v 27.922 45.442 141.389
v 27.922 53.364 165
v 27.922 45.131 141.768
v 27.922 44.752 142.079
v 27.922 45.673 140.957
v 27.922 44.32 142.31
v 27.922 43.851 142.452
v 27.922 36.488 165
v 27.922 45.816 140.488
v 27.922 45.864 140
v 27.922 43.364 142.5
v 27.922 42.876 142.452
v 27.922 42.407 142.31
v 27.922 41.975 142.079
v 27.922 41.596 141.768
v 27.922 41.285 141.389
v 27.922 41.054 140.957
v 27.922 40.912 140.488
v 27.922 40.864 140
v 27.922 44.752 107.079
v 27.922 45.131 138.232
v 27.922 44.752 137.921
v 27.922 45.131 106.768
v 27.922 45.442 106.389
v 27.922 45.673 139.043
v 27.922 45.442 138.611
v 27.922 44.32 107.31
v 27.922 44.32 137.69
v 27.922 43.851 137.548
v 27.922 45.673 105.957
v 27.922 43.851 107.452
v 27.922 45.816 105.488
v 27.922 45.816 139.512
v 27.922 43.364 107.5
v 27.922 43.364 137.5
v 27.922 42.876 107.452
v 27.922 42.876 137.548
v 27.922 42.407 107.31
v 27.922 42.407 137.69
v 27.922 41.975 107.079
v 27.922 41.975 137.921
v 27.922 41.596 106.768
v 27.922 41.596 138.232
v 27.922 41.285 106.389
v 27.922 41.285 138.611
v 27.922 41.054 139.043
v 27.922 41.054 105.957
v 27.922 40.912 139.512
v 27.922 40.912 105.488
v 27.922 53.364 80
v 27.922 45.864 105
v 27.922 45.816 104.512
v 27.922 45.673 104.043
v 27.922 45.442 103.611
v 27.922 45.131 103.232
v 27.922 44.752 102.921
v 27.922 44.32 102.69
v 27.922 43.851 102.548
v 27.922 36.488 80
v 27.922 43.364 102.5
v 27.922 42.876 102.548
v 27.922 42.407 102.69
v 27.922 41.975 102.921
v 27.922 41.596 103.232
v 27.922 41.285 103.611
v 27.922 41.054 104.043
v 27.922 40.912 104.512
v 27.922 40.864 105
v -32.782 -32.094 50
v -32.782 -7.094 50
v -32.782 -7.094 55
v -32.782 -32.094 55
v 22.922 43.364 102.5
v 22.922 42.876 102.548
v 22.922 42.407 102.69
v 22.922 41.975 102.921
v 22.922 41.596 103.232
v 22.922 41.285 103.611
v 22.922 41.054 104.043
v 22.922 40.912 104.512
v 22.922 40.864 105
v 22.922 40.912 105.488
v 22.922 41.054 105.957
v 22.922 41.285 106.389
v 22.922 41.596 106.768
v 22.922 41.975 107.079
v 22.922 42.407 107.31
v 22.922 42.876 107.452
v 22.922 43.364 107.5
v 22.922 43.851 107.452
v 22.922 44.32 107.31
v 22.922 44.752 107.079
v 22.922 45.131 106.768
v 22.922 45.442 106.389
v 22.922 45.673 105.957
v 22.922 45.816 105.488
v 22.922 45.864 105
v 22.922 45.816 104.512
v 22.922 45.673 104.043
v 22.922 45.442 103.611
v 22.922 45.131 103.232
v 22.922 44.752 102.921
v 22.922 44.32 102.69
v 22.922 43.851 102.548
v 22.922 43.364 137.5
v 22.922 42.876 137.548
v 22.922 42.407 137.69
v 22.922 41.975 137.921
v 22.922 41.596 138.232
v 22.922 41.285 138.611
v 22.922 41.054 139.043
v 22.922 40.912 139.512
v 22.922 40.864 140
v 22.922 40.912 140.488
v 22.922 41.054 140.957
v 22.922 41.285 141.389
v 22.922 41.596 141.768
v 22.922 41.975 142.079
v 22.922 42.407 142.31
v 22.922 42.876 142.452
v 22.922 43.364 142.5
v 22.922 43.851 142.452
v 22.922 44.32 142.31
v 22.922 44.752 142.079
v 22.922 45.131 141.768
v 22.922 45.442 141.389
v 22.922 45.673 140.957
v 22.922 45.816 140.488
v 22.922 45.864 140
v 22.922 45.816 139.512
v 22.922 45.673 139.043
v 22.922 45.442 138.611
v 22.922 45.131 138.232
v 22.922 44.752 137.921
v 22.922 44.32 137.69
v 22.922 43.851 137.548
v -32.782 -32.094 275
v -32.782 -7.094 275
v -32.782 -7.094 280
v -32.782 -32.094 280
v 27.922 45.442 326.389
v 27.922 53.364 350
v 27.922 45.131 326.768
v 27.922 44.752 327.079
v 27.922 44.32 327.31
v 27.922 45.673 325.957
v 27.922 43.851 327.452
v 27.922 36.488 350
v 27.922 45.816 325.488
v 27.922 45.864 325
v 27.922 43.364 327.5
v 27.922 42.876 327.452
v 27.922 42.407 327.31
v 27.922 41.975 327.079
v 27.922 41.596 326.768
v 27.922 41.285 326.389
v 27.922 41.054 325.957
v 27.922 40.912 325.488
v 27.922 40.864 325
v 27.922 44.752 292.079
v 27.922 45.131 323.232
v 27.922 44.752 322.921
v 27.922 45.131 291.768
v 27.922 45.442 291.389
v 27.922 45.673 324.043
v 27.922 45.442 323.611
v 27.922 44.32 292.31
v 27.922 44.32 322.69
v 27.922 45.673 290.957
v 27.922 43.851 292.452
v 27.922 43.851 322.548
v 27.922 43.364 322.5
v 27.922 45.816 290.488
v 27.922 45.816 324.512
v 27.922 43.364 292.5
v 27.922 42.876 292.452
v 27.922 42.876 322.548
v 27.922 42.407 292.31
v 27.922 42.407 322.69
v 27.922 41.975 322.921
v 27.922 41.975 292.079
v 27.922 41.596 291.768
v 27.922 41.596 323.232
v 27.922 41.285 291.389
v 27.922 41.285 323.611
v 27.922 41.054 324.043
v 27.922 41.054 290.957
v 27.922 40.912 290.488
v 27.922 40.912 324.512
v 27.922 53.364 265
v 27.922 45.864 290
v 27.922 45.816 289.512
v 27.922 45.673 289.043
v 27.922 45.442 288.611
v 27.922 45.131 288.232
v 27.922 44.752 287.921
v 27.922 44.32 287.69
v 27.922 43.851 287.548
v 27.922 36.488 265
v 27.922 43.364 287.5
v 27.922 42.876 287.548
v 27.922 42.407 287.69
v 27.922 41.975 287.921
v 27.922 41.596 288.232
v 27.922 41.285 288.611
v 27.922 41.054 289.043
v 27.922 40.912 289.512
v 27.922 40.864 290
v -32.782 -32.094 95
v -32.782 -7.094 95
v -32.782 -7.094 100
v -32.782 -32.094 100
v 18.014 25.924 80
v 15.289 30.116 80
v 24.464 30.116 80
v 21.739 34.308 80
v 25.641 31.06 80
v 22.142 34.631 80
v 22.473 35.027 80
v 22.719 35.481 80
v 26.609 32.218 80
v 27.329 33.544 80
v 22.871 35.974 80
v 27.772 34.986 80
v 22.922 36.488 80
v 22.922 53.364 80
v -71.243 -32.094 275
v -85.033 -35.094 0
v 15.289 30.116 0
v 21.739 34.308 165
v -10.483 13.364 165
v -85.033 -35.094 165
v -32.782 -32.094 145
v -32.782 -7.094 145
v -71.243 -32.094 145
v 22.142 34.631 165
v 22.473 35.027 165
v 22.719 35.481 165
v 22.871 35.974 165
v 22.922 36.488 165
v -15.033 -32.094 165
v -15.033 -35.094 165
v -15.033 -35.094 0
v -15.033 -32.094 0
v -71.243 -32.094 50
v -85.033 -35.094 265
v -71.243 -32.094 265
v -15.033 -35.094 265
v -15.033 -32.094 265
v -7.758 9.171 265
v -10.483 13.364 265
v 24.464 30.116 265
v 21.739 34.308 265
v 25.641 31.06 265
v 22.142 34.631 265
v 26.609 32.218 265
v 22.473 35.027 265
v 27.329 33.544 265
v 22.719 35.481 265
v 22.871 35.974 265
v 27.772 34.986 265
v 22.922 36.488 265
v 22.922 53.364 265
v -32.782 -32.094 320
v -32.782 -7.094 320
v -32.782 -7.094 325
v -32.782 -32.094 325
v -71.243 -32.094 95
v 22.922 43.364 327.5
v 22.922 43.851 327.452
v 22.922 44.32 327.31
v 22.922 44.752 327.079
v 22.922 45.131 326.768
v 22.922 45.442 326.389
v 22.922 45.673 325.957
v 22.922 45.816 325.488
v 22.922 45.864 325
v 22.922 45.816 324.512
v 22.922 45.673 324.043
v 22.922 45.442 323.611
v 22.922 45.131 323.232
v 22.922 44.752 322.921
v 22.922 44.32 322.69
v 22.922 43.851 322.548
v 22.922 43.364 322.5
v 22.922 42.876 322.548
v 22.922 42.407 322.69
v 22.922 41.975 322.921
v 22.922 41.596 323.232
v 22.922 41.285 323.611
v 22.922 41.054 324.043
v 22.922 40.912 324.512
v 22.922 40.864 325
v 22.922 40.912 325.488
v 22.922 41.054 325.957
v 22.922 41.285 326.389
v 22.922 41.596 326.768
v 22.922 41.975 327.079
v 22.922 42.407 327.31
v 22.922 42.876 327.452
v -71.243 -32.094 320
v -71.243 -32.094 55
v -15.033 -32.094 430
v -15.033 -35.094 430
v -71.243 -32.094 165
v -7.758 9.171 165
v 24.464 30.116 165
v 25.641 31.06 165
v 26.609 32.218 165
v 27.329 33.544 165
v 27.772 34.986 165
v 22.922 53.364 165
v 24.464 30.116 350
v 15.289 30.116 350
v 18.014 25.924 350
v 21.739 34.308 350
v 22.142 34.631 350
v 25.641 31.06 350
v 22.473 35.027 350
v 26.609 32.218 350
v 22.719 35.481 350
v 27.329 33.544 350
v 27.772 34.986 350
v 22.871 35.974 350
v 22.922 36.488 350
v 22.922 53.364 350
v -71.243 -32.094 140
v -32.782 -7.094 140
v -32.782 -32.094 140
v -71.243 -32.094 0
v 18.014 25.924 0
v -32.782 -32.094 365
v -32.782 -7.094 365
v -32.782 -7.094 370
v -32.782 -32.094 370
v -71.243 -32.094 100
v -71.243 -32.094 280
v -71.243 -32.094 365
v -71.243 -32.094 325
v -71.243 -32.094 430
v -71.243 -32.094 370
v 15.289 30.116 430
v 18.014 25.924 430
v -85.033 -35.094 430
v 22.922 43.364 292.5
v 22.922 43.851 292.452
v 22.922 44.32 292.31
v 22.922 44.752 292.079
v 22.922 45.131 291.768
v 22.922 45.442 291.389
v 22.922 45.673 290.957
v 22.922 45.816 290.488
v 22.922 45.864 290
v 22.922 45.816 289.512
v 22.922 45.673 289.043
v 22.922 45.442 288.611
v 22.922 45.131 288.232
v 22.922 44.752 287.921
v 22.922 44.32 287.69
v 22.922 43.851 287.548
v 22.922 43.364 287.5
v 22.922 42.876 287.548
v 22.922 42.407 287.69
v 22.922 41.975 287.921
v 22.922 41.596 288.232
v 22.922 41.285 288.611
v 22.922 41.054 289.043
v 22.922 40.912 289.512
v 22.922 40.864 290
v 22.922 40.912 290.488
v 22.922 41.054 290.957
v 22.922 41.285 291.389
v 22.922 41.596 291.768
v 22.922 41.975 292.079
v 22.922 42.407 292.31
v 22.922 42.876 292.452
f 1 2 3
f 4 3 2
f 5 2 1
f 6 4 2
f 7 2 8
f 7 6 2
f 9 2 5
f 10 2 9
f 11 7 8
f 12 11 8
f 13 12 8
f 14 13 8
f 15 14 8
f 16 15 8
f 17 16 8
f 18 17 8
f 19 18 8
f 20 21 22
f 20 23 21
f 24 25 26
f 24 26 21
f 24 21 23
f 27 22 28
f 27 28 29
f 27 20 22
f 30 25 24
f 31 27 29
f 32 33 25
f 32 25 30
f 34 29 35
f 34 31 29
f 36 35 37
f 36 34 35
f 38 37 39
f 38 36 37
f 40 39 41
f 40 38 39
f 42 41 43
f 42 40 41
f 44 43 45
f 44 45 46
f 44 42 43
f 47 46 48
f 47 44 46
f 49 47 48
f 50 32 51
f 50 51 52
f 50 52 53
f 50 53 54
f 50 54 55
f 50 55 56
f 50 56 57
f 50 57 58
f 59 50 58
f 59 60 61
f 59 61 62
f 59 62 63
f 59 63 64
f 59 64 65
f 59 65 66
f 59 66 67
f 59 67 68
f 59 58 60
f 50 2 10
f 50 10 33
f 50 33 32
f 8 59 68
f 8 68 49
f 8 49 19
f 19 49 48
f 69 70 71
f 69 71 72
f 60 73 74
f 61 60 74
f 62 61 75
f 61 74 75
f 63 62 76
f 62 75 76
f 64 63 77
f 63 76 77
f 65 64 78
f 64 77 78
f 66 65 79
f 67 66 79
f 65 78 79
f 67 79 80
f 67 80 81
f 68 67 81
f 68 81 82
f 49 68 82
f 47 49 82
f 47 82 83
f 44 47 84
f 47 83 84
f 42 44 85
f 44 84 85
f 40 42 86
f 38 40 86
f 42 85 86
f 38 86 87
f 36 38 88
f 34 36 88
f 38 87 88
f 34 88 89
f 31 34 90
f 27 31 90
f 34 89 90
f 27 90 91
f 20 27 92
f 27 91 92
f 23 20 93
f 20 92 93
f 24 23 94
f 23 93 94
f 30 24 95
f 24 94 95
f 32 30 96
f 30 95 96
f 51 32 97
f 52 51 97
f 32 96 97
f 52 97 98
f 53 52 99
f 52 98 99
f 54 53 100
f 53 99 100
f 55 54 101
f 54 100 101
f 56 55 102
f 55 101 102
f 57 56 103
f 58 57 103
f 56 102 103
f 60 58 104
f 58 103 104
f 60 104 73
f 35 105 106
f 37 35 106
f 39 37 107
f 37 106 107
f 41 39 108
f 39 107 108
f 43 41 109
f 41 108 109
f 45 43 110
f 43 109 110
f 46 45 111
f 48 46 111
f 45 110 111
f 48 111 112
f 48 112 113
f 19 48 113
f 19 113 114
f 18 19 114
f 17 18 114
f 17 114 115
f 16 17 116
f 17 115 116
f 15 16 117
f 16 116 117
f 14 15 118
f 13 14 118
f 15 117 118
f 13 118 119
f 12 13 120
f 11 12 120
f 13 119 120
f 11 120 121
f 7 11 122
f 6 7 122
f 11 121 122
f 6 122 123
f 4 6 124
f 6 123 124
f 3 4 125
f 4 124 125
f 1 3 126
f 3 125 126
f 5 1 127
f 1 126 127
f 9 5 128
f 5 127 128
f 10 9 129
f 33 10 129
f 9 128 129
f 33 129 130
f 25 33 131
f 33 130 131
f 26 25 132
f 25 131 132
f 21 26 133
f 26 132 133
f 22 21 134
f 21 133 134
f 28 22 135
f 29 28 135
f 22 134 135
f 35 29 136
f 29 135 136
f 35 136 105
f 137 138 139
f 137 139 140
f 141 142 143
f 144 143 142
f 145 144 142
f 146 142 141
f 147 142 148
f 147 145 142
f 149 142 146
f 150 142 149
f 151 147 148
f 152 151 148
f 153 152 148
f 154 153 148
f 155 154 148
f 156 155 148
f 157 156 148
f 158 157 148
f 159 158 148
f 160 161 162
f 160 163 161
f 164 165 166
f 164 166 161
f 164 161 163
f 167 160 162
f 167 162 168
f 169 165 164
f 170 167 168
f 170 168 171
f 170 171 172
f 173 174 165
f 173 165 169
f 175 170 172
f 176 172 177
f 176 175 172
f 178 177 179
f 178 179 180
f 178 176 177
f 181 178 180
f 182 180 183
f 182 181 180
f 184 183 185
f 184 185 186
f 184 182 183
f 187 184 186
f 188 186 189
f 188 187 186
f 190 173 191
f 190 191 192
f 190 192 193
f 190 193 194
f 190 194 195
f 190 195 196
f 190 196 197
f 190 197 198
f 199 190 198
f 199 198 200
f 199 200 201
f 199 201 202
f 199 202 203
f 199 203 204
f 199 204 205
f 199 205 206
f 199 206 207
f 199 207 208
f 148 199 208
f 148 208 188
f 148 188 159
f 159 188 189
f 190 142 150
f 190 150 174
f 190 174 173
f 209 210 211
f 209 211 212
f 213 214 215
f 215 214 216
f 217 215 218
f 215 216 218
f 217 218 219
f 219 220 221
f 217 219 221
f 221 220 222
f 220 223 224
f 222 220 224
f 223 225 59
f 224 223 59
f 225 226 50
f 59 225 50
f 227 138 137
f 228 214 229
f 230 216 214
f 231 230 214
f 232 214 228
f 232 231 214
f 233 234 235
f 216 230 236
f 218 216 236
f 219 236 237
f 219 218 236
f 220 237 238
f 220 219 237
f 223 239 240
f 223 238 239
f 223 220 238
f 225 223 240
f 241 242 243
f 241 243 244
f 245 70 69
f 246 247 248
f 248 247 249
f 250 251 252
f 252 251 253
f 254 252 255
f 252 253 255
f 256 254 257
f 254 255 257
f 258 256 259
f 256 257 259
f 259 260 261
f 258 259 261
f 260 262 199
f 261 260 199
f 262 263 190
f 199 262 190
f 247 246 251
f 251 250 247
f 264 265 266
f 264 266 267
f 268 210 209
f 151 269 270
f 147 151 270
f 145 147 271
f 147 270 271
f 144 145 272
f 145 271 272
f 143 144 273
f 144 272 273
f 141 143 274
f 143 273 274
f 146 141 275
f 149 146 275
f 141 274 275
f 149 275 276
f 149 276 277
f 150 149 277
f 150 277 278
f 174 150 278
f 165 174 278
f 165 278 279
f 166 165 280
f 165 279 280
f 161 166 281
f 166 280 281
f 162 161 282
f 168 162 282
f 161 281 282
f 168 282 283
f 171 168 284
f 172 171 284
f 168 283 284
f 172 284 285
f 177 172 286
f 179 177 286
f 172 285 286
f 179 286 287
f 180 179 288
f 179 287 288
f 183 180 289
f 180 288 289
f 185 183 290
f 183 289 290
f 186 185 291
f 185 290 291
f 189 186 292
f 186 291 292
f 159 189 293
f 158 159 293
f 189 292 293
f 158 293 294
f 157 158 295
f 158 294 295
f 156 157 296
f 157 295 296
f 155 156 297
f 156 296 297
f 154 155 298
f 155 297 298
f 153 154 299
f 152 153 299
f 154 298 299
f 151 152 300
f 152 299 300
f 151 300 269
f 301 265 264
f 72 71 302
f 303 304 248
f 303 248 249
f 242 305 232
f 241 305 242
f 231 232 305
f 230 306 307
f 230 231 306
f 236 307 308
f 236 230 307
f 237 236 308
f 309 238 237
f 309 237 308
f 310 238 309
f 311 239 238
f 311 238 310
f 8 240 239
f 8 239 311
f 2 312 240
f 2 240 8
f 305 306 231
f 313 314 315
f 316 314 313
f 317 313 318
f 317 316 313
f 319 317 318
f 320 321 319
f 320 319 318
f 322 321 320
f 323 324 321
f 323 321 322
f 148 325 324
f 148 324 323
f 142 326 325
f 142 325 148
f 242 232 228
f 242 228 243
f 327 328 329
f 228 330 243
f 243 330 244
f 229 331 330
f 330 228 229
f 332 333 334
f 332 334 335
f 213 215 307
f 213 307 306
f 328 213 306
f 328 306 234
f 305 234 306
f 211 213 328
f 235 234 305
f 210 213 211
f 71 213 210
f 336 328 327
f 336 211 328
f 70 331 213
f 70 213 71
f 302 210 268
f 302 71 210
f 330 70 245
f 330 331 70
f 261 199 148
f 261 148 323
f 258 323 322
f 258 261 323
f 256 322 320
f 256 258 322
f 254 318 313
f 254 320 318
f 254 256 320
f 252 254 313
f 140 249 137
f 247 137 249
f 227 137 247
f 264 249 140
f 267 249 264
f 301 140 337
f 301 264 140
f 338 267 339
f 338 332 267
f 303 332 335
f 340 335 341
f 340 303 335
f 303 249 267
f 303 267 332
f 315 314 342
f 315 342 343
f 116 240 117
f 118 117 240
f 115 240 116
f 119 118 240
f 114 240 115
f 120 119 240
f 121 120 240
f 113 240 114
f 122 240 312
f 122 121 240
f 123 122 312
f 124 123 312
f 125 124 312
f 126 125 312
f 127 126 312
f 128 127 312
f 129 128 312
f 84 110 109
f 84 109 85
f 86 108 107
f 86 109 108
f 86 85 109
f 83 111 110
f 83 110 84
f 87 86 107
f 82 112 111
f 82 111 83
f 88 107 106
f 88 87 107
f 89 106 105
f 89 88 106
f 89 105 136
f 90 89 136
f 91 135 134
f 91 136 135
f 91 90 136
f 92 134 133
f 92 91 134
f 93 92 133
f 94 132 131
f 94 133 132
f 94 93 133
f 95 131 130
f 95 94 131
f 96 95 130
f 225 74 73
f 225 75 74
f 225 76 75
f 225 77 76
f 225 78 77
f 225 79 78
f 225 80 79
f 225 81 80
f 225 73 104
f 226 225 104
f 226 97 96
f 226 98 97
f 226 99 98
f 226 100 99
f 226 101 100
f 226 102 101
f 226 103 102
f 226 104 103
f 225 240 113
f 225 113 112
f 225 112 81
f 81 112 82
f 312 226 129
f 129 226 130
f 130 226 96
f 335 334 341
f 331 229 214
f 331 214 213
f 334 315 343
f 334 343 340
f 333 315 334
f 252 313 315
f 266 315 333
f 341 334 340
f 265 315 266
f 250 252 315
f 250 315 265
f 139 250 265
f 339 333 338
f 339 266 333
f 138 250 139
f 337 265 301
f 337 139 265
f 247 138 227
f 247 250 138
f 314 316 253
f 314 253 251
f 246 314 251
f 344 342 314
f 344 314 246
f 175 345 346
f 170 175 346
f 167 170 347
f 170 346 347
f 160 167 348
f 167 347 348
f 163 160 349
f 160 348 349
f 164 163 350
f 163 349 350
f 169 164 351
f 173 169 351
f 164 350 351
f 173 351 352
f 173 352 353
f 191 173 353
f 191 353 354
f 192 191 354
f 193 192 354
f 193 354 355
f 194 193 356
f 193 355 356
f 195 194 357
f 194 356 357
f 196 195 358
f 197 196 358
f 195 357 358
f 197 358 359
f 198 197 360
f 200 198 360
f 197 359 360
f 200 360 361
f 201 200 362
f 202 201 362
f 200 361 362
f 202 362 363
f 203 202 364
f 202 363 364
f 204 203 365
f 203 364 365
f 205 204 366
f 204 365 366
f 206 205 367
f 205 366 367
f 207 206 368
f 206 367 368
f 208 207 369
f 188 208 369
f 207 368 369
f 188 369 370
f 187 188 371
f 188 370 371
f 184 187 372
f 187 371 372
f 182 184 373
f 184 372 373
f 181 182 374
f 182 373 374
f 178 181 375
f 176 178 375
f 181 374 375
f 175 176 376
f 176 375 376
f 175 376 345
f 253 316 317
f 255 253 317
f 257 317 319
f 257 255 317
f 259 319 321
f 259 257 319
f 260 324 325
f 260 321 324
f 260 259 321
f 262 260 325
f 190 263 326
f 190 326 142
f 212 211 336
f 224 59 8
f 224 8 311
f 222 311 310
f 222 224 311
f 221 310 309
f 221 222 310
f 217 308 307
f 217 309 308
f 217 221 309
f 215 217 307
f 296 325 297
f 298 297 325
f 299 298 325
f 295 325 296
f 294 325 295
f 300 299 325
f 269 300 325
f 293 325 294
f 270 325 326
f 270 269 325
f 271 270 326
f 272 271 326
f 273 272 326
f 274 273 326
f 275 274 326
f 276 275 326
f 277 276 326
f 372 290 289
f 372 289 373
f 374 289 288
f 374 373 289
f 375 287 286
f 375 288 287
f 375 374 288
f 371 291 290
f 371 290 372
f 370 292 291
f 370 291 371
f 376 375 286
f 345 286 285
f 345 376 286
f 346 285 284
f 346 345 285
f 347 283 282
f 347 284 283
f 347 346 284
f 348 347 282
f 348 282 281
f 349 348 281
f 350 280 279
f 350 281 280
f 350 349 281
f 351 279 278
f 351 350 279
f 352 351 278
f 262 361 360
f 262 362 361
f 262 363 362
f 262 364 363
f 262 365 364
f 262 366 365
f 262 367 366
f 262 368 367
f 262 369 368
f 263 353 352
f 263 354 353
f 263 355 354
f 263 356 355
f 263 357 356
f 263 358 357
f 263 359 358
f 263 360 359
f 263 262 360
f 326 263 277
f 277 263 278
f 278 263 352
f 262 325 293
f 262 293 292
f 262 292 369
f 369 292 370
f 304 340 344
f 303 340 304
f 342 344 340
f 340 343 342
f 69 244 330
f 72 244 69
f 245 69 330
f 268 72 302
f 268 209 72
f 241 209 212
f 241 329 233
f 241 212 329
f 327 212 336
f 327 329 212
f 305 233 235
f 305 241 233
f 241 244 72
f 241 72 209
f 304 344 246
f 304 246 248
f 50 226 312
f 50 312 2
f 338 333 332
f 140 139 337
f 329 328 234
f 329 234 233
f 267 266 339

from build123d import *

# Parameters (mm, degrees)
BASE_FLANGE2_DEPTH   = 430
CUT_EXTRUDE1_START   = 165
CUT_EXTRUDE1_DEPTH   = 100
CUT_EXTRUDE1_2_DEPTH = 80
CUT_EXTRUDE1_START_2 = 350
CUT_EXTRUDE1_3_DEPTH = 80
BOSS_EXTRUDE2_DEPTH  = 430
BOSS_EXTRUDE3_START  = 50
BOSS_EXTRUDE3_DEPTH  = 5
LPATTERN1_COUNT      = 8
LPATTERN1_PITCH      = 45
SKETCH13_R           = 2.5
CUT_EXTRUDE2_DEPTH   = 5
SKETCH14_W           = 88.914799092
SKETCH14_H           = 100
CUT_EXTRUDE3_DEPTH   = 440.40419449


# Read off the part's stored shape, not the designer's step: Cut-Extrude1
# Sheet-metal steps are written as plain solids
with BuildPart() as part:
    # Sketch1 → Base-Flange2 (new body)
    with BuildSketch(Plane.XY):
        with BuildLine():
            Line((27.921955125, 53.363555481), (27.921955125, 36.487969417))
            ThreePointArc((27.921955125, 36.487969417), (27.001720358, 32.862954046), (24.463866589, 30.115797933))
            Line((24.463866589, 30.115797933), (-72.078044875, -32.636444519))
            Line((-72.078044875, -32.636444519), (-74.802986628, -28.444226438))
            Line((-74.802986628, -28.444226438), (21.738924836, 34.308016014))
            ThreePointArc((21.738924836, 34.308016014), (22.607137968, 35.24783258), (22.921955125, 36.487969417))
            Line((22.921955125, 36.487969417), (22.921955125, 53.363555481))
            Line((22.921955125, 53.363555481), (27.921955125, 53.363555481))
        make_face()
    extrude(amount=BASE_FLANGE2_DEPTH)

    # Cut-Extrude1 outline → Cut-Extrude1 (cut)
    with BuildSketch(Plane.XY.offset(CUT_EXTRUDE1_START)):
        with BuildLine():
            Line((21.738924836, 34.308016014), (-10.483322138, 13.363555481))
            Line((-10.483322138, 13.363555481), (-7.758380385, 9.171337399))
            Line((-7.758380385, 9.171337399), (24.463866589, 30.115797933))
            ThreePointArc((24.463866589, 30.115797933), (27.001720358, 32.862954046), (27.921955125, 36.487969417))
            Line((27.921955125, 36.487969417), (27.921955125, 53.363555481))
            Line((27.921955125, 53.363555481), (22.921955125, 53.363555481))
            Line((22.921955125, 53.363555481), (22.921955125, 36.487969417))
            ThreePointArc((22.921955125, 36.487969417), (22.607137968, 35.247832579), (21.738924836, 34.308016014))
        make_face()
    extrude(amount=CUT_EXTRUDE1_DEPTH, mode=Mode.SUBTRACT)

    # Cut-Extrude1 2 outline → Cut-Extrude1 2 (cut)
    with BuildSketch(Plane.XY):
        with BuildLine():
            Line((21.738924836, 34.308016014), (15.289358557, 30.115797933))
            Line((15.289358557, 30.115797933), (18.01430031, 25.923579851))
            Line((18.01430031, 25.923579851), (24.463866589, 30.115797933))
            ThreePointArc((24.463866589, 30.115797933), (27.001720358, 32.862954046), (27.921955125, 36.487969417))
            Line((27.921955125, 36.487969417), (27.921955125, 53.363555481))
            Line((27.921955125, 53.363555481), (22.921955125, 53.363555481))
            Line((22.921955125, 53.363555481), (22.921955125, 36.487969417))
            ThreePointArc((22.921955125, 36.487969417), (22.607137968, 35.247832579), (21.738924836, 34.308016014))
        make_face()
    extrude(amount=CUT_EXTRUDE1_2_DEPTH, mode=Mode.SUBTRACT)

    # Cut-Extrude1 3 outline → Cut-Extrude1 3 (cut)
    with BuildSketch(Plane.XY.offset(CUT_EXTRUDE1_START_2)):
        with BuildLine():
            Line((21.738924836, 34.308016014), (15.289358557, 30.115797933))
            Line((15.289358557, 30.115797933), (18.01430031, 25.923579851))
            Line((18.01430031, 25.923579851), (24.463866589, 30.115797933))
            ThreePointArc((24.463866589, 30.115797933), (27.001720358, 32.862954046), (27.921955125, 36.487969417))
            Line((27.921955125, 36.487969417), (27.921955125, 53.363555481))
            Line((27.921955125, 53.363555481), (22.921955125, 53.363555481))
            Line((22.921955125, 53.363555481), (22.921955125, 36.487969417))
            ThreePointArc((22.921955125, 36.487969417), (22.607137968, 35.247832579), (21.738924836, 34.308016014))
        make_face()
    extrude(amount=CUT_EXTRUDE1_3_DEPTH, mode=Mode.SUBTRACT)

    # Sketch11 → Boss-Extrude2 (add)
    with BuildSketch(Plane.XY.offset(430)):
        Polygon((-74.802986628, -28.444226438), (-85.033367831, -35.09397422), (-15.033367831, -35.09397422), (-15.033367831, -32.09397422), (-71.243475184, -32.09397422), (-72.078044875, -32.636444519), align=None)
    extrude(amount=-BOSS_EXTRUDE2_DEPTH)

    # Sketch12 → Boss-Extrude3 (add)
    with BuildSketch(Plane.XY.offset(BOSS_EXTRUDE3_START)):
        Polygon((-32.781936722, -7.09397422), (-32.781936722, -32.09397422), (-71.243475184, -32.09397422), align=None)
    boss_extrude3 = extrude(amount=BOSS_EXTRUDE3_DEPTH)

    # LPattern1: Boss-Extrude3 ×8
    with Locations(*[(0, 0, i * LPATTERN1_PITCH) for i in range(1, LPATTERN1_COUNT)]):
        add(boss_extrude3)

    # Sketch13 → Cut-Extrude2 (cut)
    with BuildSketch(Plane.ZY.offset(-22.921955125)):
        with Locations((325, 43.363555481)):
            Circle(SKETCH13_R)
        with Locations((290, 43.363555481)):
            Circle(SKETCH13_R)
        with Locations(Location((140, 43.363555481, 0), (0, 0, 180))):
            Circle(SKETCH13_R)
        with Locations(Location((105, 43.363555481, 0), (0, 0, 180))):
            Circle(SKETCH13_R)
    extrude(amount=-CUT_EXTRUDE2_DEPTH, mode=Mode.SUBTRACT)

    # Sketch14 → Cut-Extrude3 (cut, through all)
    with BuildSketch(Plane(origin=(-9.220045459, 14.184685322, 0), x_dir=(0.8384436163006371, 0.5449883505954143, 0), z_dir=(-0.5449883505954142, 0.838443616300637, 0))):
        with Locations((-45.964092011, -215)):
            Rectangle(SKETCH14_W, SKETCH14_H)
    extrude(amount=-CUT_EXTRUDE3_DEPTH, mode=Mode.SUBTRACT)


with BuildPart() as cut_extrude3_piece_1:
    # of the separate pieces the step leaves, piece 1, a body of its own (cut_extrude3_pieces)
    add(part.part.solids().sort_by_distance((22.921955125, 53.363555481, 80))[0])


with BuildPart() as cut_extrude3_piece_2:
    # of the separate pieces the step leaves, piece 2, a body of its own (cut_extrude3_pieces)
    add(part.part.solids().sort_by_distance((21.738924836, 34.308016014, 265))[0])


solid = Compound([cut_extrude3_piece_1.part, cut_extrude3_piece_2.part])
